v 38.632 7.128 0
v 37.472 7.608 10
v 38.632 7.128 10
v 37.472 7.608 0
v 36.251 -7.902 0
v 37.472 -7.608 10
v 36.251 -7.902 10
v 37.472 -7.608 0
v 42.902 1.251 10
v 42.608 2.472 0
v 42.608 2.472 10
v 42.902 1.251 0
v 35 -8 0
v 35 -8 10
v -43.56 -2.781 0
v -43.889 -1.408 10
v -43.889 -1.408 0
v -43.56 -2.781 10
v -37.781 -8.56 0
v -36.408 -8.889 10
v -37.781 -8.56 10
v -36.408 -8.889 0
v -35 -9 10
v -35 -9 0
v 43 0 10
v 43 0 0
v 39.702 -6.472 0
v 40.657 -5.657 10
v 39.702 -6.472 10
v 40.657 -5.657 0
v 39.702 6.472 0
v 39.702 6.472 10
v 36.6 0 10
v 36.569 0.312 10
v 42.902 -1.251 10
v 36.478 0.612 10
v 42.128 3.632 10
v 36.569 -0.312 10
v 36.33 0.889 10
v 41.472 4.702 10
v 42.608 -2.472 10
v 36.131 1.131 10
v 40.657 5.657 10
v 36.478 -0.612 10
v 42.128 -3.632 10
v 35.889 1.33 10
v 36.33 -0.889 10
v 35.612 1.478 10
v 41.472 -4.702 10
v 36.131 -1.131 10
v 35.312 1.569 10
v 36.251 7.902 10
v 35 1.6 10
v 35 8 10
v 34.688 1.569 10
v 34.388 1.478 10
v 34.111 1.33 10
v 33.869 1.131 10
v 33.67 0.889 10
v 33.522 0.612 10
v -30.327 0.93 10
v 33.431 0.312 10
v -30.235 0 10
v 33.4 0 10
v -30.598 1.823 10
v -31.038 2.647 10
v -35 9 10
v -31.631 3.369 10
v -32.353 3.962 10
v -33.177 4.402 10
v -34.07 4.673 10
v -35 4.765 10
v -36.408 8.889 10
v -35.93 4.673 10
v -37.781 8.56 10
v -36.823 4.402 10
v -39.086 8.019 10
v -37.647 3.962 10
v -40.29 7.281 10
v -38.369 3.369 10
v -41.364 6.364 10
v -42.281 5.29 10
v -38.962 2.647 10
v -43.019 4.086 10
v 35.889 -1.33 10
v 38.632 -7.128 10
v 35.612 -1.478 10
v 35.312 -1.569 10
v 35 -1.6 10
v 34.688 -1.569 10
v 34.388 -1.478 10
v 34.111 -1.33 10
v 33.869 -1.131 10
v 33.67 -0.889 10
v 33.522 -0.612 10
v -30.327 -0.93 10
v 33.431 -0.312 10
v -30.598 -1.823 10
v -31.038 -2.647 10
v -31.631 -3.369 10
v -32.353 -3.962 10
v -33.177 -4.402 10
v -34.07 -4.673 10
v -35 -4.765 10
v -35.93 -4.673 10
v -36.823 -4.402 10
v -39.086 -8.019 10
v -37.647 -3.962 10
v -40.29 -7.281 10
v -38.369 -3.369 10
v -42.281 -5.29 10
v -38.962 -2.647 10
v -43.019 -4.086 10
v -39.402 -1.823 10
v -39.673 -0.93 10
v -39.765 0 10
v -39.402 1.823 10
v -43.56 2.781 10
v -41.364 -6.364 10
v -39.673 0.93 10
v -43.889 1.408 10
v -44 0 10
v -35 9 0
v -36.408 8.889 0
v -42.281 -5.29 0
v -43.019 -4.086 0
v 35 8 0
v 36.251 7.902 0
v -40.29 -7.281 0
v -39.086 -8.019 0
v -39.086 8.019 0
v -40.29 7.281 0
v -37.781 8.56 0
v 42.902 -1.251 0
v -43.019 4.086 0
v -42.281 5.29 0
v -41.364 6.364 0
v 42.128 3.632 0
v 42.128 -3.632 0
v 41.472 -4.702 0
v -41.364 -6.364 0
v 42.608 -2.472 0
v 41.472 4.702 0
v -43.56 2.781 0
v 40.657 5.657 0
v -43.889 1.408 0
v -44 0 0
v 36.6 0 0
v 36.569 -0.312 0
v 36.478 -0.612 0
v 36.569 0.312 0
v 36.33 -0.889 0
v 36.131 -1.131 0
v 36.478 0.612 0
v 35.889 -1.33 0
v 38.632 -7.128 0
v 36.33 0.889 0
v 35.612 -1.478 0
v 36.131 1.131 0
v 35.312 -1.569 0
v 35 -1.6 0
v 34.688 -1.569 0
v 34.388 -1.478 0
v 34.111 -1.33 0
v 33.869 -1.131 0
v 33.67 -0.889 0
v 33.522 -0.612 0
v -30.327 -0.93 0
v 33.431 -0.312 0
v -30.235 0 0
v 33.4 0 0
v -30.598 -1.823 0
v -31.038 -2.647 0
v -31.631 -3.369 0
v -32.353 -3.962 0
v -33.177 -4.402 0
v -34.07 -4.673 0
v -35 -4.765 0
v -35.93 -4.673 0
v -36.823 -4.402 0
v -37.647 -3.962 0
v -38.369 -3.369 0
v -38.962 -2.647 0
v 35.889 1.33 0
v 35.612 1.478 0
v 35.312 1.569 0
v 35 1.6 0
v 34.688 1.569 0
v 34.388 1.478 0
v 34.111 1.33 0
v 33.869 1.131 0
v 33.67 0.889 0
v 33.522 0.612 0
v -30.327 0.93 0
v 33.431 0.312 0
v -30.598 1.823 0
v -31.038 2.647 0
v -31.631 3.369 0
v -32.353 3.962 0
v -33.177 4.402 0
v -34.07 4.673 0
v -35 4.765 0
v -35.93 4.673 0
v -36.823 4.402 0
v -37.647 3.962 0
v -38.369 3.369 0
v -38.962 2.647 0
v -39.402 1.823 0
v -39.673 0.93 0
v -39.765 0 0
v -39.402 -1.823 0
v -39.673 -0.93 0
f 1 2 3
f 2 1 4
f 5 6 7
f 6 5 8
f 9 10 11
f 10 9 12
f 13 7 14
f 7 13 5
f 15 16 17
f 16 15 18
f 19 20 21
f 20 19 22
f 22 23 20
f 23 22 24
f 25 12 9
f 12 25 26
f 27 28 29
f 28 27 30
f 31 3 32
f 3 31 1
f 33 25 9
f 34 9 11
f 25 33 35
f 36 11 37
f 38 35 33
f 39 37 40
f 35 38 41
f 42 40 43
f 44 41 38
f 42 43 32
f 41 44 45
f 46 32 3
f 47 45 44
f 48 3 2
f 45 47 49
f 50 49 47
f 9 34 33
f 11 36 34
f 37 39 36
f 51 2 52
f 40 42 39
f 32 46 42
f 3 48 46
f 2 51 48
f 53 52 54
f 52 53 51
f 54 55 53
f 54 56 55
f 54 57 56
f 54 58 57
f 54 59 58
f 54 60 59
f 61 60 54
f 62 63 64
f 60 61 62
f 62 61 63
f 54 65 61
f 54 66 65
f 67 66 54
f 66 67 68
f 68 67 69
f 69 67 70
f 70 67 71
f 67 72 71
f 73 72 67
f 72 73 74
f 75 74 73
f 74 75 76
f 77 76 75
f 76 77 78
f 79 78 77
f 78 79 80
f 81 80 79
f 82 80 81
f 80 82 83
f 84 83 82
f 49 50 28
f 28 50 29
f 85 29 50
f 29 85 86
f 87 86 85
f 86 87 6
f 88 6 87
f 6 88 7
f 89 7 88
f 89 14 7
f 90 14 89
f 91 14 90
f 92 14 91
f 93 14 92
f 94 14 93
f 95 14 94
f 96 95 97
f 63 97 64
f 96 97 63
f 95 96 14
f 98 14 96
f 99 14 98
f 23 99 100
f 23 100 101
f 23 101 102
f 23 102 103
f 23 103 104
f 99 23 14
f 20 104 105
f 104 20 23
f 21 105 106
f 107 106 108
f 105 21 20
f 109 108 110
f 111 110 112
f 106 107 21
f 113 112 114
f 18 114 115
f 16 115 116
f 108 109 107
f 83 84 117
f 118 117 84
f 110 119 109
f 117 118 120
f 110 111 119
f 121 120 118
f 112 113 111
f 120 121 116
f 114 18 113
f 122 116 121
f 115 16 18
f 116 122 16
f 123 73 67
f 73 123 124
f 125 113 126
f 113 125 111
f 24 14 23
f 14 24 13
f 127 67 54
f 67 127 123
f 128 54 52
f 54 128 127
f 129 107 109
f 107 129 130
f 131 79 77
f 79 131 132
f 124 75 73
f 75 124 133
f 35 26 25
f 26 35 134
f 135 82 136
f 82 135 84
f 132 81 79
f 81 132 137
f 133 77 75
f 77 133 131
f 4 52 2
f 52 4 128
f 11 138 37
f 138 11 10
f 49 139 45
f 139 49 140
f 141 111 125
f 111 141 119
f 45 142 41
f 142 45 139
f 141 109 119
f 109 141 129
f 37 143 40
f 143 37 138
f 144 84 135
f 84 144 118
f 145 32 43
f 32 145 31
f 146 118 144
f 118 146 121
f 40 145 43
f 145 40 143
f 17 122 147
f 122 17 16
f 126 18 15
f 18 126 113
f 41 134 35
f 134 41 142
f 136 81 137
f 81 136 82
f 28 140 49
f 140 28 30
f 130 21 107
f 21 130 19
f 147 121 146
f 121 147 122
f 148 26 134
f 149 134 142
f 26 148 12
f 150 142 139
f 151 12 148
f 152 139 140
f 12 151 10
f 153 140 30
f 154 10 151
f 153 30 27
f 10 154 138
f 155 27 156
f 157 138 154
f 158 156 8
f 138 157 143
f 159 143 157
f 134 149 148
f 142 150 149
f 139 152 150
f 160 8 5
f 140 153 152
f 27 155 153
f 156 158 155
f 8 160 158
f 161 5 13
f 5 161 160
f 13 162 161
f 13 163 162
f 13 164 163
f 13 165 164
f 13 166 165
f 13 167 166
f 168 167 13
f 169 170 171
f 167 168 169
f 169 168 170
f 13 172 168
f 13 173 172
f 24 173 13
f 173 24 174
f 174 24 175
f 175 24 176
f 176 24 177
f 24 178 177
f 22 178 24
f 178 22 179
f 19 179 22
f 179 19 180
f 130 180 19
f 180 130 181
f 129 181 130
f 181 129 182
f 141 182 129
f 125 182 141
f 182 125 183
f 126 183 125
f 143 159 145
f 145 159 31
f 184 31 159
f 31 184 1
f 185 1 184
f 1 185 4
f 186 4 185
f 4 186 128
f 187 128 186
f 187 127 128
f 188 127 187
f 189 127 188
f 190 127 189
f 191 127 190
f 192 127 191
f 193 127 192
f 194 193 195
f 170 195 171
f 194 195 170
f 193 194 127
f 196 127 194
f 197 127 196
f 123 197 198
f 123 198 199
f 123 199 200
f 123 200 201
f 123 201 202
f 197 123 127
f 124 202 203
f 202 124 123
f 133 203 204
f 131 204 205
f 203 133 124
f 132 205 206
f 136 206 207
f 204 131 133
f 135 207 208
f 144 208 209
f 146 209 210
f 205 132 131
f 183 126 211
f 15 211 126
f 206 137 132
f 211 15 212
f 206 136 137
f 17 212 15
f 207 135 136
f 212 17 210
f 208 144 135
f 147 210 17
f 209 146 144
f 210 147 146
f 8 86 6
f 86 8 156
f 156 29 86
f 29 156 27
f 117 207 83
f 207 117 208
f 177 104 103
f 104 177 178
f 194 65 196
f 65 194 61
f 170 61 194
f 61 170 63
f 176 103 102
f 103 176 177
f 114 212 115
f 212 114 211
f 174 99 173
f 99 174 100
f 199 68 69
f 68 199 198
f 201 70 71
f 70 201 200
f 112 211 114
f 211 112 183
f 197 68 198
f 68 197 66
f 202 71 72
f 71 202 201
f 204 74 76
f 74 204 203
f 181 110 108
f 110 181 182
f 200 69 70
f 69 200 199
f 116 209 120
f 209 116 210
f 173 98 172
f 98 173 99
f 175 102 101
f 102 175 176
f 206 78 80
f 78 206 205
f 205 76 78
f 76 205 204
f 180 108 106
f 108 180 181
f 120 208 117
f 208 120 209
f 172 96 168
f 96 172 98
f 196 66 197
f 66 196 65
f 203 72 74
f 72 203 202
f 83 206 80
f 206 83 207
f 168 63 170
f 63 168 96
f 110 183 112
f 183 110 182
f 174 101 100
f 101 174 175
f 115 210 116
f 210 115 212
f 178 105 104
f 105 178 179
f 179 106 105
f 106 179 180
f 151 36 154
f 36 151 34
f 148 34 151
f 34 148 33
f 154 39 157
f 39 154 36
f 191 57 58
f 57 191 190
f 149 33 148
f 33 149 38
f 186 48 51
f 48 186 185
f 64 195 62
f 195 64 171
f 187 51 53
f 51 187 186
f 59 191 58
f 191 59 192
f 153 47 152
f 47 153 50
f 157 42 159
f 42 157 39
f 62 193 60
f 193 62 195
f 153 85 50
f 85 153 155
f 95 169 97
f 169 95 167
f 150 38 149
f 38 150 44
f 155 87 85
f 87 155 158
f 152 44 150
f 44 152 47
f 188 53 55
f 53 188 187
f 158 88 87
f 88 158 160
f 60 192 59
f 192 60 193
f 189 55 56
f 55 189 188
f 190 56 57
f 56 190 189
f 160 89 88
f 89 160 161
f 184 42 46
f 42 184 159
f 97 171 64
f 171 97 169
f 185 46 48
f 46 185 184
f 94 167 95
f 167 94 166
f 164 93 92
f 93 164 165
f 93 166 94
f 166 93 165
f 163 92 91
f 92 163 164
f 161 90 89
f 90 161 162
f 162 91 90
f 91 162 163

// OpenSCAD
$fn = 32;

// ----------------------------------------------------------------------
// Lever: 70 mm between the bosses, 10 mm thick, smooth outline
// ----------------------------------------------------------------------

// --- parameters (mm) ---
lever_l = 70;             // distance between the boss centres
boss_a = 18;              // first boss diameter
boss_b = 16;              // second boss diameter
bore_a = 9.53;            // first bore
bore_b = 3.2;             // second bore
lever_t = 10;             // lever thickness

lever_profile = [[-44, 0], [-43.889, -1.408], [-43.56, -2.781], [-43.019, -4.086], [-42.281, -5.29], [-41.364, -6.364], [-40.29, -7.281], [-39.086, -8.019], [-37.781, -8.56], [-36.408, -8.889], [-35, -9], [35, -8], [36.251, -7.902], [37.472, -7.608], [38.632, -7.128], [39.702, -6.472], [40.657, -5.657], [41.472, -4.702], [42.128, -3.632], [42.608, -2.472], [42.902, -1.251], [43, 0], [42.902, 1.251], [42.608, 2.472], [42.128, 3.632], [41.472, 4.702], [40.657, 5.657], [39.702, 6.472], [38.632, 7.128], [37.472, 7.608], [36.251, 7.902], [35, 8], [-35, 9], [-36.408, 8.889], [-37.781, 8.56], [-39.086, 8.019], [-40.29, 7.281], [-41.364, 6.364], [-42.281, 5.29], [-43.019, 4.086], [-43.56, 2.781], [-43.889, 1.408]];

difference() {
  linear_extrude(height = lever_t) polygon(lever_profile);
  translate([-35, 0, -2.5]) cylinder(h = lever_t + 5, d = bore_a);
  translate([35, 0, -2.5]) cylinder(h = lever_t + 5, d = bore_b);
}
